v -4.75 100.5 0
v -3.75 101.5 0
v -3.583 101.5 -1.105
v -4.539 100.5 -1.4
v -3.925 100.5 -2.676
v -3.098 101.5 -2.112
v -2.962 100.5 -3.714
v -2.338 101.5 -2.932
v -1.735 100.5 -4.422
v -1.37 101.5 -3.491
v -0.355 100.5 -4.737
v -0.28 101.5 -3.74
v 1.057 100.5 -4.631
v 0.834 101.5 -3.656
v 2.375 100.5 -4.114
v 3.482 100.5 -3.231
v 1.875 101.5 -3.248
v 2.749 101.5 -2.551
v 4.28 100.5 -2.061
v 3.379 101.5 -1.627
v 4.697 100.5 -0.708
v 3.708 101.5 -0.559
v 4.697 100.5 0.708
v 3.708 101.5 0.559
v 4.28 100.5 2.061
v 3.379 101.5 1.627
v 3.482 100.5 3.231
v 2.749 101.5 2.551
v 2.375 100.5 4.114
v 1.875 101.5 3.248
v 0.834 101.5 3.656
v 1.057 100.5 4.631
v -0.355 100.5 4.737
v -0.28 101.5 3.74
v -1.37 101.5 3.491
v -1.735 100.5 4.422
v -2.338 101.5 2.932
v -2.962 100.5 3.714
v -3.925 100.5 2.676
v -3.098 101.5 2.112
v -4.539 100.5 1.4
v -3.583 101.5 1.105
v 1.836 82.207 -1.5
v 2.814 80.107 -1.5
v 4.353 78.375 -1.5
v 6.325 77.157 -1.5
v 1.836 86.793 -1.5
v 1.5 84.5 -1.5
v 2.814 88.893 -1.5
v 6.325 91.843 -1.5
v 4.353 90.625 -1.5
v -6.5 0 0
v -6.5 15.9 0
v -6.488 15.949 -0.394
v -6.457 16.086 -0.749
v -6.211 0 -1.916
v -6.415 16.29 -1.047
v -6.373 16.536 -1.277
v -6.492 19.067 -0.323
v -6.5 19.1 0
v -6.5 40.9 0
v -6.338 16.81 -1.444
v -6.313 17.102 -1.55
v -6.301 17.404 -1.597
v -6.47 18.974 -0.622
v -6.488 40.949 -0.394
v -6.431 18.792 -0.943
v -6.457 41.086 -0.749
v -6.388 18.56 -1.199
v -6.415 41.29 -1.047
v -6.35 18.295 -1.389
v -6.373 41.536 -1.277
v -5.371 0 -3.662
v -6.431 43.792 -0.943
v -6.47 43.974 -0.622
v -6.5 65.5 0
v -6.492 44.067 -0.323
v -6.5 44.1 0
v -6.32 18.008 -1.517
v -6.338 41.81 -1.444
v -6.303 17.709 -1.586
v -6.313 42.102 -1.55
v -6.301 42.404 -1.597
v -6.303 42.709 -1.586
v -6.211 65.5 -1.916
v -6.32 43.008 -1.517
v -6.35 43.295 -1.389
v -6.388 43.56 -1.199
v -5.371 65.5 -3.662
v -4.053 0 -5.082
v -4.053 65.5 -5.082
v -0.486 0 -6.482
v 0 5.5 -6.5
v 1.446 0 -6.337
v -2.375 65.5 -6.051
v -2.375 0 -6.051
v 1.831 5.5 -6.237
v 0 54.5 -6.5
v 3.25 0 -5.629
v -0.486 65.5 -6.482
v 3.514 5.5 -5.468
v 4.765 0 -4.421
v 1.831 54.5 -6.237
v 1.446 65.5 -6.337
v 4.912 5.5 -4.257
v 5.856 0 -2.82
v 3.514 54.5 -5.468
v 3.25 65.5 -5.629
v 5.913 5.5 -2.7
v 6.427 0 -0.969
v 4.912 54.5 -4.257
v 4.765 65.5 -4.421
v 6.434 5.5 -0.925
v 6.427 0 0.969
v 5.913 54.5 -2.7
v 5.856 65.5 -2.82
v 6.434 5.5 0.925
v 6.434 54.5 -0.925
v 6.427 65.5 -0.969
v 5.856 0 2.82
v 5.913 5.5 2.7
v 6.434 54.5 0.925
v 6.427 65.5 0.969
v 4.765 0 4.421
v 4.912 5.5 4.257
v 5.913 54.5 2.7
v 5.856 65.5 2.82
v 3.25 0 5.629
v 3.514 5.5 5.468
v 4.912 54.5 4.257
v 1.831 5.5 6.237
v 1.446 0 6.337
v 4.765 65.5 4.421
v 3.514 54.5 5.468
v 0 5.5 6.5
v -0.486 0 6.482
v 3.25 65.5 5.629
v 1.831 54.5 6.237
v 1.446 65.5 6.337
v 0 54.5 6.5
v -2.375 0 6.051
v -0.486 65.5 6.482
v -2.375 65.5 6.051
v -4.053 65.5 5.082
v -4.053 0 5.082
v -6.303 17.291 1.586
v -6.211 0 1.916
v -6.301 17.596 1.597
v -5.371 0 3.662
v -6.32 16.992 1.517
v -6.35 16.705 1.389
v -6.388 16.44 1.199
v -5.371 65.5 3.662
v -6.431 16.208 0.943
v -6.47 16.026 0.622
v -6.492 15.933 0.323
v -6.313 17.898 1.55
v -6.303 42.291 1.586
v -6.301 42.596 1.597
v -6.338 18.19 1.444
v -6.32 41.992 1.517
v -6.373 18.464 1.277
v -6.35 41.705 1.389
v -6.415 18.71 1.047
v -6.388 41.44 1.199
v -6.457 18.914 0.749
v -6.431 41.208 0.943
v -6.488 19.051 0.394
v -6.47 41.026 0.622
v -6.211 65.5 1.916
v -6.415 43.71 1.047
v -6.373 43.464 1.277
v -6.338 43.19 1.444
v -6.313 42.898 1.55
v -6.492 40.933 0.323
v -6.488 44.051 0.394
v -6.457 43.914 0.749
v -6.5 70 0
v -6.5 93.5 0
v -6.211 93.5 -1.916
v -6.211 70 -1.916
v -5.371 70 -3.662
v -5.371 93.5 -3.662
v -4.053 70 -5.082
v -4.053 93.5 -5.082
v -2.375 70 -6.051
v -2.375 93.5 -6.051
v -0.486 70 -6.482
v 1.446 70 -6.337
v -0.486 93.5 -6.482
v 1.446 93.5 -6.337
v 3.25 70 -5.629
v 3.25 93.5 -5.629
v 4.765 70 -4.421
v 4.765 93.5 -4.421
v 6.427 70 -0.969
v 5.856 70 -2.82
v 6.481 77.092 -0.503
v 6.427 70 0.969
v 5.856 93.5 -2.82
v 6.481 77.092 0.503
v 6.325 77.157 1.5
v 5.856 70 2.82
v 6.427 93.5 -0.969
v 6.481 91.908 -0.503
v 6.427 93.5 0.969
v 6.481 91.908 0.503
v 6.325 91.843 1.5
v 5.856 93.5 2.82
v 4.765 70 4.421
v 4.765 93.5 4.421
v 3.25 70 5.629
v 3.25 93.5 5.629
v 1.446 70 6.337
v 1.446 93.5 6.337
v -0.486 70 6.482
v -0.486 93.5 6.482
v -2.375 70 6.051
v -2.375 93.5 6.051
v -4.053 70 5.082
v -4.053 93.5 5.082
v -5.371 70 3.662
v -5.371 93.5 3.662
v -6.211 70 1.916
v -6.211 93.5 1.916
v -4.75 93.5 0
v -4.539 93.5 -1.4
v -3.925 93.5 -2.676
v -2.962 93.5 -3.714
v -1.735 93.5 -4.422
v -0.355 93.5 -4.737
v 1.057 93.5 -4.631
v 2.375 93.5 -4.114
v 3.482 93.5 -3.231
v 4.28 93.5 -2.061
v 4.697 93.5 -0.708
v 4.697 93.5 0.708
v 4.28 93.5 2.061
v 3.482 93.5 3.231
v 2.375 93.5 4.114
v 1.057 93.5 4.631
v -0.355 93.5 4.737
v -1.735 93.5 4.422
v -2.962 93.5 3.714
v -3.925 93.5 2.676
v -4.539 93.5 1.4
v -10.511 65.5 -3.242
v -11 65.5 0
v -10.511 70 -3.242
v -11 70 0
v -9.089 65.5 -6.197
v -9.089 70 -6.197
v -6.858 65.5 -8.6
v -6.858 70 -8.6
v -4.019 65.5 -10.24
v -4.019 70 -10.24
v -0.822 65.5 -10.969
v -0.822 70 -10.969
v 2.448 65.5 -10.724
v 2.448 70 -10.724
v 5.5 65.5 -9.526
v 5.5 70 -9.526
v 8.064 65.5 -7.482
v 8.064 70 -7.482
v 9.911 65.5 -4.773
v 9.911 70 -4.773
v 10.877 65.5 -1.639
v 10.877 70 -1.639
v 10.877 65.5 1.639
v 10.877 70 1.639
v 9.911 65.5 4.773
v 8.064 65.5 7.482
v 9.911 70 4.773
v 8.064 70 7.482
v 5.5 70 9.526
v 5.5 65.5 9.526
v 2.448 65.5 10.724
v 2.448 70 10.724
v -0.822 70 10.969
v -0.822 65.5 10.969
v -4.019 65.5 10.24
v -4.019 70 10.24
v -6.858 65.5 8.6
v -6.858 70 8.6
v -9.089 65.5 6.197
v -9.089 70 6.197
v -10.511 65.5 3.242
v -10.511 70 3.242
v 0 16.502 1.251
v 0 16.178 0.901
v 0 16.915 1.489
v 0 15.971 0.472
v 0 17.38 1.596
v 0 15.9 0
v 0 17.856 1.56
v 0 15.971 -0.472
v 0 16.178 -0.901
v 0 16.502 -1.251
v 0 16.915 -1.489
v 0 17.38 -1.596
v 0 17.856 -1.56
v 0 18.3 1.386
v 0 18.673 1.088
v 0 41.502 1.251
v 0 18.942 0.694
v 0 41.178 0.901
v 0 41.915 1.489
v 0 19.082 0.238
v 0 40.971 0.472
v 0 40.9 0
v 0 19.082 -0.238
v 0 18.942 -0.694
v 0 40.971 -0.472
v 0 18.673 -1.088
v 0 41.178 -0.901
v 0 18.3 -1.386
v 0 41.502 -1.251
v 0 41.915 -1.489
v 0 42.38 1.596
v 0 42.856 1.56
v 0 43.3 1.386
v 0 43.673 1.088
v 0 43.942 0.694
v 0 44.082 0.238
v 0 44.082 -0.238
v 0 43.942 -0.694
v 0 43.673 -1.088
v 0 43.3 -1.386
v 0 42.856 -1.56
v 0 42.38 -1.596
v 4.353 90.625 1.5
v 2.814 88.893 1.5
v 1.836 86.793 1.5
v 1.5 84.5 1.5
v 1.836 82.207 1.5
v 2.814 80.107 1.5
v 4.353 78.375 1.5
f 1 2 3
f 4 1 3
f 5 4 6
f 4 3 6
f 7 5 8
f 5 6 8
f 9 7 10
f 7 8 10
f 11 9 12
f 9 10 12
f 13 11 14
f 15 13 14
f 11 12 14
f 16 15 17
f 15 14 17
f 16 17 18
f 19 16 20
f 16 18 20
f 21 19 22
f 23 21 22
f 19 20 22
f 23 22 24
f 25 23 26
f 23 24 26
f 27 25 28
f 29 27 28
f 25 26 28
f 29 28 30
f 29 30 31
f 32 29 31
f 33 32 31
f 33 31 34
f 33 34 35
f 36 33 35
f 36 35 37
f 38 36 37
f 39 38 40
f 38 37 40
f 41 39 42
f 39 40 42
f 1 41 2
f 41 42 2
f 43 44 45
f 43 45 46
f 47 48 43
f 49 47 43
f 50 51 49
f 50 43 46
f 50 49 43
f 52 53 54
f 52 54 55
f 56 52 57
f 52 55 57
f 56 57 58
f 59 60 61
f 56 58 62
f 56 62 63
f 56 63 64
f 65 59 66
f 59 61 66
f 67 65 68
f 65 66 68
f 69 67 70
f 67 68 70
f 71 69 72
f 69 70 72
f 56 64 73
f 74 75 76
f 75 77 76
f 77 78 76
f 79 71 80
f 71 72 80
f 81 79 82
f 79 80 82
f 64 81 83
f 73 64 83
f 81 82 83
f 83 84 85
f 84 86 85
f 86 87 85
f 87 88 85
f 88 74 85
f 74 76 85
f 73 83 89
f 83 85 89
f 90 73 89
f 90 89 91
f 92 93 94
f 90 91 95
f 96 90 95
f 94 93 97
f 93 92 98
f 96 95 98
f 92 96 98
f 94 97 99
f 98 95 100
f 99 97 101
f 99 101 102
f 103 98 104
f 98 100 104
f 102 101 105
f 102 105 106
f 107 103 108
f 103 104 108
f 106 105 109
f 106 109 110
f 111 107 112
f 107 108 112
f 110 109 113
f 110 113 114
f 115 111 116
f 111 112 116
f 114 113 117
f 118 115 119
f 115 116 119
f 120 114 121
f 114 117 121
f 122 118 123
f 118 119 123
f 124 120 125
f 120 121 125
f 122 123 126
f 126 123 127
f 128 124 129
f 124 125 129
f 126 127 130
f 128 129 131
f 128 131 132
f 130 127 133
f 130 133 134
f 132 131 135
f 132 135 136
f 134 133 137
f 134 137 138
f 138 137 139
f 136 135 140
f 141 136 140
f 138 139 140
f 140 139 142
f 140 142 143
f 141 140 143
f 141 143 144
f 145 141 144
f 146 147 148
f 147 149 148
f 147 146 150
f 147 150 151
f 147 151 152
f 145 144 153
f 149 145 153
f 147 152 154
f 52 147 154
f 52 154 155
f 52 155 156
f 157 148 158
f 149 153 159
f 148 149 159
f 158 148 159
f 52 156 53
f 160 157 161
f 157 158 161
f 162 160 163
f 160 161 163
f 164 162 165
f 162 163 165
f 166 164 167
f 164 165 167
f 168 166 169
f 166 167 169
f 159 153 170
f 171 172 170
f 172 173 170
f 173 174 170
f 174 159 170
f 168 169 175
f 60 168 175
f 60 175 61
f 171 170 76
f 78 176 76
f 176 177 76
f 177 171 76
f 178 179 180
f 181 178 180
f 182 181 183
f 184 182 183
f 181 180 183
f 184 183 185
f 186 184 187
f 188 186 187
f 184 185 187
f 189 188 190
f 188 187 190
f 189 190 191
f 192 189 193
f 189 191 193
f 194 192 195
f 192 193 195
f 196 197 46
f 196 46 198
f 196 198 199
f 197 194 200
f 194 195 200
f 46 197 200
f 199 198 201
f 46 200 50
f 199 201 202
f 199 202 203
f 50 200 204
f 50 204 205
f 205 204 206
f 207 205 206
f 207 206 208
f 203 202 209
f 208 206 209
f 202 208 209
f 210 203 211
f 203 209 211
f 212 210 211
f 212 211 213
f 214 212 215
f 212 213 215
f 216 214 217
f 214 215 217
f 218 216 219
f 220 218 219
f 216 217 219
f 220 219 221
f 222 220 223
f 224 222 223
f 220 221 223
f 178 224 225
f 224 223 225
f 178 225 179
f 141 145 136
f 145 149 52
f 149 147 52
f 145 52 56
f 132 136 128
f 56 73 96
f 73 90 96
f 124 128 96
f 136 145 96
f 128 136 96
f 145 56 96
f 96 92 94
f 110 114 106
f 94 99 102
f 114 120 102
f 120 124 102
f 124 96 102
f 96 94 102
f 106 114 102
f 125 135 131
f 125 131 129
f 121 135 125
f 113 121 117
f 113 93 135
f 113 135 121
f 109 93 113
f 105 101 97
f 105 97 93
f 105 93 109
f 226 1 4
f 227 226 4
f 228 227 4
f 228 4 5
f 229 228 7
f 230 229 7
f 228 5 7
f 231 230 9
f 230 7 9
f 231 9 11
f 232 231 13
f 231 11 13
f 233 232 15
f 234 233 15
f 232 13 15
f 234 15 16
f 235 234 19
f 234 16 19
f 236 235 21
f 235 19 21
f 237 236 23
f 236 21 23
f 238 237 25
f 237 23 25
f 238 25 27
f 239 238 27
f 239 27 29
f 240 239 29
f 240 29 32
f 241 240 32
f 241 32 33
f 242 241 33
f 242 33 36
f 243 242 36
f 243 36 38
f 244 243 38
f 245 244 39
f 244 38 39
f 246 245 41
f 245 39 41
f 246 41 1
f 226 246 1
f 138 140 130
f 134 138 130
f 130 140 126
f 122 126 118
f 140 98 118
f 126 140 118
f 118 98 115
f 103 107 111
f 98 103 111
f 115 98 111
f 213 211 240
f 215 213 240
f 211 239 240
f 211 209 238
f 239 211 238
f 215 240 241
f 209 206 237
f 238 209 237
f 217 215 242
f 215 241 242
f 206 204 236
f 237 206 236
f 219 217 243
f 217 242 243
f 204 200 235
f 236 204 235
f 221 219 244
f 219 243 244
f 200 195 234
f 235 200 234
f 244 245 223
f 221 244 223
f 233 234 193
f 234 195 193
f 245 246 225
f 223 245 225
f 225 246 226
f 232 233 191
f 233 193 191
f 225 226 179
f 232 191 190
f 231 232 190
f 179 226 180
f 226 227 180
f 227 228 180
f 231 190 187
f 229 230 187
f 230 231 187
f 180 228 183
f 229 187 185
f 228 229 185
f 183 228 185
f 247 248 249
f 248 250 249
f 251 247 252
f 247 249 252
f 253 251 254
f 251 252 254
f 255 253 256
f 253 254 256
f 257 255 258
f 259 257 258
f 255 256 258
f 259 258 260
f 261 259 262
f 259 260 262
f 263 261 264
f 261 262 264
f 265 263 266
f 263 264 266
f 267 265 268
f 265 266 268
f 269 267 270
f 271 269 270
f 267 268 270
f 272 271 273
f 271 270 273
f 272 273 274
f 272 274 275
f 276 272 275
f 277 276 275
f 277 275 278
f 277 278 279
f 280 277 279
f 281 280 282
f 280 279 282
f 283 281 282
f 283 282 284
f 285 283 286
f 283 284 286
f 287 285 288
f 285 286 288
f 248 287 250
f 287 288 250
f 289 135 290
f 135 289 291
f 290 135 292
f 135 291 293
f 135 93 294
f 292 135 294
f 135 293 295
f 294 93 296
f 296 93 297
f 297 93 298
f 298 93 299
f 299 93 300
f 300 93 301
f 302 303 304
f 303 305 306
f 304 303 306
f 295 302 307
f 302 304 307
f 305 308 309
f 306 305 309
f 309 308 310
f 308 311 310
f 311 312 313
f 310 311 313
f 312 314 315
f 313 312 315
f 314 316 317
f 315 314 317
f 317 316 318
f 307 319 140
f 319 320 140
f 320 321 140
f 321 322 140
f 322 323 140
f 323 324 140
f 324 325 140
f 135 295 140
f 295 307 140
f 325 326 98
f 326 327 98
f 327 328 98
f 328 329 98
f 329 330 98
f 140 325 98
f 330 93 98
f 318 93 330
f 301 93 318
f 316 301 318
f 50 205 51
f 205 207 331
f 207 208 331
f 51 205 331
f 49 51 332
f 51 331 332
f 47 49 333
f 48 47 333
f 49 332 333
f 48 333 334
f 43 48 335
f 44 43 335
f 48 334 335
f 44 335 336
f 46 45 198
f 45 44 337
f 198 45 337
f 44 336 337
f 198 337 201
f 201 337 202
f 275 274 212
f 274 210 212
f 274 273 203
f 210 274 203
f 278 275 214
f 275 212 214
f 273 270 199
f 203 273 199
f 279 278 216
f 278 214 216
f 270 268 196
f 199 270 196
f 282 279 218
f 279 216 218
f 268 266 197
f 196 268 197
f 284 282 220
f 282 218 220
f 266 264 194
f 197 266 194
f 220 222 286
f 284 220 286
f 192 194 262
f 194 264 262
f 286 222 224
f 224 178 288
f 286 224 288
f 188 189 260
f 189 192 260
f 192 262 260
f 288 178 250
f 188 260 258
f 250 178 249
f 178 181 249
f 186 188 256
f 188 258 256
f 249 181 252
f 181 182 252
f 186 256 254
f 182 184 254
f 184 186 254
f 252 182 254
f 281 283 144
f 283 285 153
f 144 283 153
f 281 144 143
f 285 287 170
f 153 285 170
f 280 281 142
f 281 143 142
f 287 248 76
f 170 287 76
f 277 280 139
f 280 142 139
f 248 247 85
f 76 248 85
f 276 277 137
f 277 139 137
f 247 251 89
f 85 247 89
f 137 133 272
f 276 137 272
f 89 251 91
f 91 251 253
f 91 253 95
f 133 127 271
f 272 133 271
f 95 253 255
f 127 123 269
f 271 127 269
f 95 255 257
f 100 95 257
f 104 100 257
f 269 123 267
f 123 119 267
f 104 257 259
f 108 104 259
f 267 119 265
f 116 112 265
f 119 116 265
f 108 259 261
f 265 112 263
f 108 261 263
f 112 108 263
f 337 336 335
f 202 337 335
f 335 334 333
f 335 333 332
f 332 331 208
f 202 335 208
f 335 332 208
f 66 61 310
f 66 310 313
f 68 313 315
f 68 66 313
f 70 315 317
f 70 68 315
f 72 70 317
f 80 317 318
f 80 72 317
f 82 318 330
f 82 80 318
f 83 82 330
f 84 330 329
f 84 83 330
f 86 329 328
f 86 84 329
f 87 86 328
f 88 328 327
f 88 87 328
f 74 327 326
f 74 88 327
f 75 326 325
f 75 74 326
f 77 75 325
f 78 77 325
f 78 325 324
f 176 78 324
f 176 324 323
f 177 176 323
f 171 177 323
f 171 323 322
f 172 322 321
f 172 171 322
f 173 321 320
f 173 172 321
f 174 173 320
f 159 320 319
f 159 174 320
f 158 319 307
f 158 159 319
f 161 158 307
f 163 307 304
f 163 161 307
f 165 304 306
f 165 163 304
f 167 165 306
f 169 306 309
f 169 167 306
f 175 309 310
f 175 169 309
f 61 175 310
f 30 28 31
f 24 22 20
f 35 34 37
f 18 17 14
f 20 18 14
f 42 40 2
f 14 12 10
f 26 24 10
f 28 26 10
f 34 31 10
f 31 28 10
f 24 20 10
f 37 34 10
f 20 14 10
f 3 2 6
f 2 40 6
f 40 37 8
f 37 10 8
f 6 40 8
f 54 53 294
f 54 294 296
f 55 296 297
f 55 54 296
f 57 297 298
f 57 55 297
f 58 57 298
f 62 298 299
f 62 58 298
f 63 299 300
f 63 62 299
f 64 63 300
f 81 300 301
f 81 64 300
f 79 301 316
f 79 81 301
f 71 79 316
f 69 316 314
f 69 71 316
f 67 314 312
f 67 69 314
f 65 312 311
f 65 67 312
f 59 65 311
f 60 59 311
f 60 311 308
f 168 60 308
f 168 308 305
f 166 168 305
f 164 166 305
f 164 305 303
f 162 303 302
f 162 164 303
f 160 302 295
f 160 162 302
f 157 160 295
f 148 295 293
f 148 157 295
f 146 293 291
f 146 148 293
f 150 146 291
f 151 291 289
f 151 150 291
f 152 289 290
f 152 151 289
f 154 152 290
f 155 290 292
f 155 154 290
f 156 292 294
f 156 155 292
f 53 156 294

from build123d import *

# Parameters (mm, degrees)
CHAMFER1_SIZE           = 1
CUT_EXTRUDE2_DEPTH      = 103.685198544
CUT_EXTRUDE2_DEPTH_BACK = 103.685198544
SKETCH2_W               = 13.680212399
SKETCH2_H               = 49
SKETCH3_R               = 8
CUT_EXTRUDE3_DEPTH      = 1.5
CUT_EXTRUDE4_DEPTH      = 103.685198544
CUT_EXTRUDE4_DEPTH_BACK = 103.685198544
SKETCH7_R               = 1.6


with BuildPart() as part:
    # Sketch1 → Revolve1 (revolve)
    with BuildSketch(Plane.XY, mode=Mode.PRIVATE) as revolve1_sk:
        Polygon((0, 0), (6.5, 0), (6.5, 65.5), (11, 65.5), (11, 70), (6.5, 70), (6.5, 93.5), (4.75, 93.5), (4.75, 101.5), (0, 101.5), align=None)
    revolve(revolve1_sk.sketch.rotate(Axis((0, 101.5, 0), (0, -1, 0)), 180), axis=Axis((0, 101.5, 0), (0, -1, 0)))

    # Chamfer1
    chamfer1_edges = [part.edges().sort_by_distance(p)[0] for p in [
        (4.75, 101.5, 0),
    ]]
    chamfer(chamfer1_edges, length=CHAMFER1_SIZE)

    # Sketch2 → Cut-Extrude2 (cut, two sides: drawn at the far end of the back side and taken through both)
    with BuildSketch(Plane.XY.offset(-CUT_EXTRUDE2_DEPTH_BACK)):
        with Locations((6.8401062, 30)):
            Rectangle(SKETCH2_W, SKETCH2_H)
    extrude(amount=CUT_EXTRUDE2_DEPTH + CUT_EXTRUDE2_DEPTH_BACK, mode=Mode.SUBTRACT)

    # Sketch3 → Cut-Extrude3 (cut, symmetric)
    with BuildSketch(Plane.XY):
        with Locations((9.5, 84.5)):
            Circle(SKETCH3_R)
    extrude(amount=CUT_EXTRUDE3_DEPTH, both=True, mode=Mode.SUBTRACT)

    # Sketch7 → Cut-Extrude4 (cut, two sides: drawn at the far end of the back side and taken through both)
    with BuildSketch(Plane(origin=(0, 0, 0), x_dir=(0, 0, -1), z_dir=(1, 0, 0)).offset(-CUT_EXTRUDE4_DEPTH_BACK)):
        with Locations(Location((0, 42.5, 0), (0, 0, 270))):
            Circle(SKETCH7_R)
        with Locations(Location((0, 17.5, 0), (0, 0, 270))):
            Circle(SKETCH7_R)
    extrude(amount=CUT_EXTRUDE4_DEPTH + CUT_EXTRUDE4_DEPTH_BACK, mode=Mode.SUBTRACT)


solid = part.part
